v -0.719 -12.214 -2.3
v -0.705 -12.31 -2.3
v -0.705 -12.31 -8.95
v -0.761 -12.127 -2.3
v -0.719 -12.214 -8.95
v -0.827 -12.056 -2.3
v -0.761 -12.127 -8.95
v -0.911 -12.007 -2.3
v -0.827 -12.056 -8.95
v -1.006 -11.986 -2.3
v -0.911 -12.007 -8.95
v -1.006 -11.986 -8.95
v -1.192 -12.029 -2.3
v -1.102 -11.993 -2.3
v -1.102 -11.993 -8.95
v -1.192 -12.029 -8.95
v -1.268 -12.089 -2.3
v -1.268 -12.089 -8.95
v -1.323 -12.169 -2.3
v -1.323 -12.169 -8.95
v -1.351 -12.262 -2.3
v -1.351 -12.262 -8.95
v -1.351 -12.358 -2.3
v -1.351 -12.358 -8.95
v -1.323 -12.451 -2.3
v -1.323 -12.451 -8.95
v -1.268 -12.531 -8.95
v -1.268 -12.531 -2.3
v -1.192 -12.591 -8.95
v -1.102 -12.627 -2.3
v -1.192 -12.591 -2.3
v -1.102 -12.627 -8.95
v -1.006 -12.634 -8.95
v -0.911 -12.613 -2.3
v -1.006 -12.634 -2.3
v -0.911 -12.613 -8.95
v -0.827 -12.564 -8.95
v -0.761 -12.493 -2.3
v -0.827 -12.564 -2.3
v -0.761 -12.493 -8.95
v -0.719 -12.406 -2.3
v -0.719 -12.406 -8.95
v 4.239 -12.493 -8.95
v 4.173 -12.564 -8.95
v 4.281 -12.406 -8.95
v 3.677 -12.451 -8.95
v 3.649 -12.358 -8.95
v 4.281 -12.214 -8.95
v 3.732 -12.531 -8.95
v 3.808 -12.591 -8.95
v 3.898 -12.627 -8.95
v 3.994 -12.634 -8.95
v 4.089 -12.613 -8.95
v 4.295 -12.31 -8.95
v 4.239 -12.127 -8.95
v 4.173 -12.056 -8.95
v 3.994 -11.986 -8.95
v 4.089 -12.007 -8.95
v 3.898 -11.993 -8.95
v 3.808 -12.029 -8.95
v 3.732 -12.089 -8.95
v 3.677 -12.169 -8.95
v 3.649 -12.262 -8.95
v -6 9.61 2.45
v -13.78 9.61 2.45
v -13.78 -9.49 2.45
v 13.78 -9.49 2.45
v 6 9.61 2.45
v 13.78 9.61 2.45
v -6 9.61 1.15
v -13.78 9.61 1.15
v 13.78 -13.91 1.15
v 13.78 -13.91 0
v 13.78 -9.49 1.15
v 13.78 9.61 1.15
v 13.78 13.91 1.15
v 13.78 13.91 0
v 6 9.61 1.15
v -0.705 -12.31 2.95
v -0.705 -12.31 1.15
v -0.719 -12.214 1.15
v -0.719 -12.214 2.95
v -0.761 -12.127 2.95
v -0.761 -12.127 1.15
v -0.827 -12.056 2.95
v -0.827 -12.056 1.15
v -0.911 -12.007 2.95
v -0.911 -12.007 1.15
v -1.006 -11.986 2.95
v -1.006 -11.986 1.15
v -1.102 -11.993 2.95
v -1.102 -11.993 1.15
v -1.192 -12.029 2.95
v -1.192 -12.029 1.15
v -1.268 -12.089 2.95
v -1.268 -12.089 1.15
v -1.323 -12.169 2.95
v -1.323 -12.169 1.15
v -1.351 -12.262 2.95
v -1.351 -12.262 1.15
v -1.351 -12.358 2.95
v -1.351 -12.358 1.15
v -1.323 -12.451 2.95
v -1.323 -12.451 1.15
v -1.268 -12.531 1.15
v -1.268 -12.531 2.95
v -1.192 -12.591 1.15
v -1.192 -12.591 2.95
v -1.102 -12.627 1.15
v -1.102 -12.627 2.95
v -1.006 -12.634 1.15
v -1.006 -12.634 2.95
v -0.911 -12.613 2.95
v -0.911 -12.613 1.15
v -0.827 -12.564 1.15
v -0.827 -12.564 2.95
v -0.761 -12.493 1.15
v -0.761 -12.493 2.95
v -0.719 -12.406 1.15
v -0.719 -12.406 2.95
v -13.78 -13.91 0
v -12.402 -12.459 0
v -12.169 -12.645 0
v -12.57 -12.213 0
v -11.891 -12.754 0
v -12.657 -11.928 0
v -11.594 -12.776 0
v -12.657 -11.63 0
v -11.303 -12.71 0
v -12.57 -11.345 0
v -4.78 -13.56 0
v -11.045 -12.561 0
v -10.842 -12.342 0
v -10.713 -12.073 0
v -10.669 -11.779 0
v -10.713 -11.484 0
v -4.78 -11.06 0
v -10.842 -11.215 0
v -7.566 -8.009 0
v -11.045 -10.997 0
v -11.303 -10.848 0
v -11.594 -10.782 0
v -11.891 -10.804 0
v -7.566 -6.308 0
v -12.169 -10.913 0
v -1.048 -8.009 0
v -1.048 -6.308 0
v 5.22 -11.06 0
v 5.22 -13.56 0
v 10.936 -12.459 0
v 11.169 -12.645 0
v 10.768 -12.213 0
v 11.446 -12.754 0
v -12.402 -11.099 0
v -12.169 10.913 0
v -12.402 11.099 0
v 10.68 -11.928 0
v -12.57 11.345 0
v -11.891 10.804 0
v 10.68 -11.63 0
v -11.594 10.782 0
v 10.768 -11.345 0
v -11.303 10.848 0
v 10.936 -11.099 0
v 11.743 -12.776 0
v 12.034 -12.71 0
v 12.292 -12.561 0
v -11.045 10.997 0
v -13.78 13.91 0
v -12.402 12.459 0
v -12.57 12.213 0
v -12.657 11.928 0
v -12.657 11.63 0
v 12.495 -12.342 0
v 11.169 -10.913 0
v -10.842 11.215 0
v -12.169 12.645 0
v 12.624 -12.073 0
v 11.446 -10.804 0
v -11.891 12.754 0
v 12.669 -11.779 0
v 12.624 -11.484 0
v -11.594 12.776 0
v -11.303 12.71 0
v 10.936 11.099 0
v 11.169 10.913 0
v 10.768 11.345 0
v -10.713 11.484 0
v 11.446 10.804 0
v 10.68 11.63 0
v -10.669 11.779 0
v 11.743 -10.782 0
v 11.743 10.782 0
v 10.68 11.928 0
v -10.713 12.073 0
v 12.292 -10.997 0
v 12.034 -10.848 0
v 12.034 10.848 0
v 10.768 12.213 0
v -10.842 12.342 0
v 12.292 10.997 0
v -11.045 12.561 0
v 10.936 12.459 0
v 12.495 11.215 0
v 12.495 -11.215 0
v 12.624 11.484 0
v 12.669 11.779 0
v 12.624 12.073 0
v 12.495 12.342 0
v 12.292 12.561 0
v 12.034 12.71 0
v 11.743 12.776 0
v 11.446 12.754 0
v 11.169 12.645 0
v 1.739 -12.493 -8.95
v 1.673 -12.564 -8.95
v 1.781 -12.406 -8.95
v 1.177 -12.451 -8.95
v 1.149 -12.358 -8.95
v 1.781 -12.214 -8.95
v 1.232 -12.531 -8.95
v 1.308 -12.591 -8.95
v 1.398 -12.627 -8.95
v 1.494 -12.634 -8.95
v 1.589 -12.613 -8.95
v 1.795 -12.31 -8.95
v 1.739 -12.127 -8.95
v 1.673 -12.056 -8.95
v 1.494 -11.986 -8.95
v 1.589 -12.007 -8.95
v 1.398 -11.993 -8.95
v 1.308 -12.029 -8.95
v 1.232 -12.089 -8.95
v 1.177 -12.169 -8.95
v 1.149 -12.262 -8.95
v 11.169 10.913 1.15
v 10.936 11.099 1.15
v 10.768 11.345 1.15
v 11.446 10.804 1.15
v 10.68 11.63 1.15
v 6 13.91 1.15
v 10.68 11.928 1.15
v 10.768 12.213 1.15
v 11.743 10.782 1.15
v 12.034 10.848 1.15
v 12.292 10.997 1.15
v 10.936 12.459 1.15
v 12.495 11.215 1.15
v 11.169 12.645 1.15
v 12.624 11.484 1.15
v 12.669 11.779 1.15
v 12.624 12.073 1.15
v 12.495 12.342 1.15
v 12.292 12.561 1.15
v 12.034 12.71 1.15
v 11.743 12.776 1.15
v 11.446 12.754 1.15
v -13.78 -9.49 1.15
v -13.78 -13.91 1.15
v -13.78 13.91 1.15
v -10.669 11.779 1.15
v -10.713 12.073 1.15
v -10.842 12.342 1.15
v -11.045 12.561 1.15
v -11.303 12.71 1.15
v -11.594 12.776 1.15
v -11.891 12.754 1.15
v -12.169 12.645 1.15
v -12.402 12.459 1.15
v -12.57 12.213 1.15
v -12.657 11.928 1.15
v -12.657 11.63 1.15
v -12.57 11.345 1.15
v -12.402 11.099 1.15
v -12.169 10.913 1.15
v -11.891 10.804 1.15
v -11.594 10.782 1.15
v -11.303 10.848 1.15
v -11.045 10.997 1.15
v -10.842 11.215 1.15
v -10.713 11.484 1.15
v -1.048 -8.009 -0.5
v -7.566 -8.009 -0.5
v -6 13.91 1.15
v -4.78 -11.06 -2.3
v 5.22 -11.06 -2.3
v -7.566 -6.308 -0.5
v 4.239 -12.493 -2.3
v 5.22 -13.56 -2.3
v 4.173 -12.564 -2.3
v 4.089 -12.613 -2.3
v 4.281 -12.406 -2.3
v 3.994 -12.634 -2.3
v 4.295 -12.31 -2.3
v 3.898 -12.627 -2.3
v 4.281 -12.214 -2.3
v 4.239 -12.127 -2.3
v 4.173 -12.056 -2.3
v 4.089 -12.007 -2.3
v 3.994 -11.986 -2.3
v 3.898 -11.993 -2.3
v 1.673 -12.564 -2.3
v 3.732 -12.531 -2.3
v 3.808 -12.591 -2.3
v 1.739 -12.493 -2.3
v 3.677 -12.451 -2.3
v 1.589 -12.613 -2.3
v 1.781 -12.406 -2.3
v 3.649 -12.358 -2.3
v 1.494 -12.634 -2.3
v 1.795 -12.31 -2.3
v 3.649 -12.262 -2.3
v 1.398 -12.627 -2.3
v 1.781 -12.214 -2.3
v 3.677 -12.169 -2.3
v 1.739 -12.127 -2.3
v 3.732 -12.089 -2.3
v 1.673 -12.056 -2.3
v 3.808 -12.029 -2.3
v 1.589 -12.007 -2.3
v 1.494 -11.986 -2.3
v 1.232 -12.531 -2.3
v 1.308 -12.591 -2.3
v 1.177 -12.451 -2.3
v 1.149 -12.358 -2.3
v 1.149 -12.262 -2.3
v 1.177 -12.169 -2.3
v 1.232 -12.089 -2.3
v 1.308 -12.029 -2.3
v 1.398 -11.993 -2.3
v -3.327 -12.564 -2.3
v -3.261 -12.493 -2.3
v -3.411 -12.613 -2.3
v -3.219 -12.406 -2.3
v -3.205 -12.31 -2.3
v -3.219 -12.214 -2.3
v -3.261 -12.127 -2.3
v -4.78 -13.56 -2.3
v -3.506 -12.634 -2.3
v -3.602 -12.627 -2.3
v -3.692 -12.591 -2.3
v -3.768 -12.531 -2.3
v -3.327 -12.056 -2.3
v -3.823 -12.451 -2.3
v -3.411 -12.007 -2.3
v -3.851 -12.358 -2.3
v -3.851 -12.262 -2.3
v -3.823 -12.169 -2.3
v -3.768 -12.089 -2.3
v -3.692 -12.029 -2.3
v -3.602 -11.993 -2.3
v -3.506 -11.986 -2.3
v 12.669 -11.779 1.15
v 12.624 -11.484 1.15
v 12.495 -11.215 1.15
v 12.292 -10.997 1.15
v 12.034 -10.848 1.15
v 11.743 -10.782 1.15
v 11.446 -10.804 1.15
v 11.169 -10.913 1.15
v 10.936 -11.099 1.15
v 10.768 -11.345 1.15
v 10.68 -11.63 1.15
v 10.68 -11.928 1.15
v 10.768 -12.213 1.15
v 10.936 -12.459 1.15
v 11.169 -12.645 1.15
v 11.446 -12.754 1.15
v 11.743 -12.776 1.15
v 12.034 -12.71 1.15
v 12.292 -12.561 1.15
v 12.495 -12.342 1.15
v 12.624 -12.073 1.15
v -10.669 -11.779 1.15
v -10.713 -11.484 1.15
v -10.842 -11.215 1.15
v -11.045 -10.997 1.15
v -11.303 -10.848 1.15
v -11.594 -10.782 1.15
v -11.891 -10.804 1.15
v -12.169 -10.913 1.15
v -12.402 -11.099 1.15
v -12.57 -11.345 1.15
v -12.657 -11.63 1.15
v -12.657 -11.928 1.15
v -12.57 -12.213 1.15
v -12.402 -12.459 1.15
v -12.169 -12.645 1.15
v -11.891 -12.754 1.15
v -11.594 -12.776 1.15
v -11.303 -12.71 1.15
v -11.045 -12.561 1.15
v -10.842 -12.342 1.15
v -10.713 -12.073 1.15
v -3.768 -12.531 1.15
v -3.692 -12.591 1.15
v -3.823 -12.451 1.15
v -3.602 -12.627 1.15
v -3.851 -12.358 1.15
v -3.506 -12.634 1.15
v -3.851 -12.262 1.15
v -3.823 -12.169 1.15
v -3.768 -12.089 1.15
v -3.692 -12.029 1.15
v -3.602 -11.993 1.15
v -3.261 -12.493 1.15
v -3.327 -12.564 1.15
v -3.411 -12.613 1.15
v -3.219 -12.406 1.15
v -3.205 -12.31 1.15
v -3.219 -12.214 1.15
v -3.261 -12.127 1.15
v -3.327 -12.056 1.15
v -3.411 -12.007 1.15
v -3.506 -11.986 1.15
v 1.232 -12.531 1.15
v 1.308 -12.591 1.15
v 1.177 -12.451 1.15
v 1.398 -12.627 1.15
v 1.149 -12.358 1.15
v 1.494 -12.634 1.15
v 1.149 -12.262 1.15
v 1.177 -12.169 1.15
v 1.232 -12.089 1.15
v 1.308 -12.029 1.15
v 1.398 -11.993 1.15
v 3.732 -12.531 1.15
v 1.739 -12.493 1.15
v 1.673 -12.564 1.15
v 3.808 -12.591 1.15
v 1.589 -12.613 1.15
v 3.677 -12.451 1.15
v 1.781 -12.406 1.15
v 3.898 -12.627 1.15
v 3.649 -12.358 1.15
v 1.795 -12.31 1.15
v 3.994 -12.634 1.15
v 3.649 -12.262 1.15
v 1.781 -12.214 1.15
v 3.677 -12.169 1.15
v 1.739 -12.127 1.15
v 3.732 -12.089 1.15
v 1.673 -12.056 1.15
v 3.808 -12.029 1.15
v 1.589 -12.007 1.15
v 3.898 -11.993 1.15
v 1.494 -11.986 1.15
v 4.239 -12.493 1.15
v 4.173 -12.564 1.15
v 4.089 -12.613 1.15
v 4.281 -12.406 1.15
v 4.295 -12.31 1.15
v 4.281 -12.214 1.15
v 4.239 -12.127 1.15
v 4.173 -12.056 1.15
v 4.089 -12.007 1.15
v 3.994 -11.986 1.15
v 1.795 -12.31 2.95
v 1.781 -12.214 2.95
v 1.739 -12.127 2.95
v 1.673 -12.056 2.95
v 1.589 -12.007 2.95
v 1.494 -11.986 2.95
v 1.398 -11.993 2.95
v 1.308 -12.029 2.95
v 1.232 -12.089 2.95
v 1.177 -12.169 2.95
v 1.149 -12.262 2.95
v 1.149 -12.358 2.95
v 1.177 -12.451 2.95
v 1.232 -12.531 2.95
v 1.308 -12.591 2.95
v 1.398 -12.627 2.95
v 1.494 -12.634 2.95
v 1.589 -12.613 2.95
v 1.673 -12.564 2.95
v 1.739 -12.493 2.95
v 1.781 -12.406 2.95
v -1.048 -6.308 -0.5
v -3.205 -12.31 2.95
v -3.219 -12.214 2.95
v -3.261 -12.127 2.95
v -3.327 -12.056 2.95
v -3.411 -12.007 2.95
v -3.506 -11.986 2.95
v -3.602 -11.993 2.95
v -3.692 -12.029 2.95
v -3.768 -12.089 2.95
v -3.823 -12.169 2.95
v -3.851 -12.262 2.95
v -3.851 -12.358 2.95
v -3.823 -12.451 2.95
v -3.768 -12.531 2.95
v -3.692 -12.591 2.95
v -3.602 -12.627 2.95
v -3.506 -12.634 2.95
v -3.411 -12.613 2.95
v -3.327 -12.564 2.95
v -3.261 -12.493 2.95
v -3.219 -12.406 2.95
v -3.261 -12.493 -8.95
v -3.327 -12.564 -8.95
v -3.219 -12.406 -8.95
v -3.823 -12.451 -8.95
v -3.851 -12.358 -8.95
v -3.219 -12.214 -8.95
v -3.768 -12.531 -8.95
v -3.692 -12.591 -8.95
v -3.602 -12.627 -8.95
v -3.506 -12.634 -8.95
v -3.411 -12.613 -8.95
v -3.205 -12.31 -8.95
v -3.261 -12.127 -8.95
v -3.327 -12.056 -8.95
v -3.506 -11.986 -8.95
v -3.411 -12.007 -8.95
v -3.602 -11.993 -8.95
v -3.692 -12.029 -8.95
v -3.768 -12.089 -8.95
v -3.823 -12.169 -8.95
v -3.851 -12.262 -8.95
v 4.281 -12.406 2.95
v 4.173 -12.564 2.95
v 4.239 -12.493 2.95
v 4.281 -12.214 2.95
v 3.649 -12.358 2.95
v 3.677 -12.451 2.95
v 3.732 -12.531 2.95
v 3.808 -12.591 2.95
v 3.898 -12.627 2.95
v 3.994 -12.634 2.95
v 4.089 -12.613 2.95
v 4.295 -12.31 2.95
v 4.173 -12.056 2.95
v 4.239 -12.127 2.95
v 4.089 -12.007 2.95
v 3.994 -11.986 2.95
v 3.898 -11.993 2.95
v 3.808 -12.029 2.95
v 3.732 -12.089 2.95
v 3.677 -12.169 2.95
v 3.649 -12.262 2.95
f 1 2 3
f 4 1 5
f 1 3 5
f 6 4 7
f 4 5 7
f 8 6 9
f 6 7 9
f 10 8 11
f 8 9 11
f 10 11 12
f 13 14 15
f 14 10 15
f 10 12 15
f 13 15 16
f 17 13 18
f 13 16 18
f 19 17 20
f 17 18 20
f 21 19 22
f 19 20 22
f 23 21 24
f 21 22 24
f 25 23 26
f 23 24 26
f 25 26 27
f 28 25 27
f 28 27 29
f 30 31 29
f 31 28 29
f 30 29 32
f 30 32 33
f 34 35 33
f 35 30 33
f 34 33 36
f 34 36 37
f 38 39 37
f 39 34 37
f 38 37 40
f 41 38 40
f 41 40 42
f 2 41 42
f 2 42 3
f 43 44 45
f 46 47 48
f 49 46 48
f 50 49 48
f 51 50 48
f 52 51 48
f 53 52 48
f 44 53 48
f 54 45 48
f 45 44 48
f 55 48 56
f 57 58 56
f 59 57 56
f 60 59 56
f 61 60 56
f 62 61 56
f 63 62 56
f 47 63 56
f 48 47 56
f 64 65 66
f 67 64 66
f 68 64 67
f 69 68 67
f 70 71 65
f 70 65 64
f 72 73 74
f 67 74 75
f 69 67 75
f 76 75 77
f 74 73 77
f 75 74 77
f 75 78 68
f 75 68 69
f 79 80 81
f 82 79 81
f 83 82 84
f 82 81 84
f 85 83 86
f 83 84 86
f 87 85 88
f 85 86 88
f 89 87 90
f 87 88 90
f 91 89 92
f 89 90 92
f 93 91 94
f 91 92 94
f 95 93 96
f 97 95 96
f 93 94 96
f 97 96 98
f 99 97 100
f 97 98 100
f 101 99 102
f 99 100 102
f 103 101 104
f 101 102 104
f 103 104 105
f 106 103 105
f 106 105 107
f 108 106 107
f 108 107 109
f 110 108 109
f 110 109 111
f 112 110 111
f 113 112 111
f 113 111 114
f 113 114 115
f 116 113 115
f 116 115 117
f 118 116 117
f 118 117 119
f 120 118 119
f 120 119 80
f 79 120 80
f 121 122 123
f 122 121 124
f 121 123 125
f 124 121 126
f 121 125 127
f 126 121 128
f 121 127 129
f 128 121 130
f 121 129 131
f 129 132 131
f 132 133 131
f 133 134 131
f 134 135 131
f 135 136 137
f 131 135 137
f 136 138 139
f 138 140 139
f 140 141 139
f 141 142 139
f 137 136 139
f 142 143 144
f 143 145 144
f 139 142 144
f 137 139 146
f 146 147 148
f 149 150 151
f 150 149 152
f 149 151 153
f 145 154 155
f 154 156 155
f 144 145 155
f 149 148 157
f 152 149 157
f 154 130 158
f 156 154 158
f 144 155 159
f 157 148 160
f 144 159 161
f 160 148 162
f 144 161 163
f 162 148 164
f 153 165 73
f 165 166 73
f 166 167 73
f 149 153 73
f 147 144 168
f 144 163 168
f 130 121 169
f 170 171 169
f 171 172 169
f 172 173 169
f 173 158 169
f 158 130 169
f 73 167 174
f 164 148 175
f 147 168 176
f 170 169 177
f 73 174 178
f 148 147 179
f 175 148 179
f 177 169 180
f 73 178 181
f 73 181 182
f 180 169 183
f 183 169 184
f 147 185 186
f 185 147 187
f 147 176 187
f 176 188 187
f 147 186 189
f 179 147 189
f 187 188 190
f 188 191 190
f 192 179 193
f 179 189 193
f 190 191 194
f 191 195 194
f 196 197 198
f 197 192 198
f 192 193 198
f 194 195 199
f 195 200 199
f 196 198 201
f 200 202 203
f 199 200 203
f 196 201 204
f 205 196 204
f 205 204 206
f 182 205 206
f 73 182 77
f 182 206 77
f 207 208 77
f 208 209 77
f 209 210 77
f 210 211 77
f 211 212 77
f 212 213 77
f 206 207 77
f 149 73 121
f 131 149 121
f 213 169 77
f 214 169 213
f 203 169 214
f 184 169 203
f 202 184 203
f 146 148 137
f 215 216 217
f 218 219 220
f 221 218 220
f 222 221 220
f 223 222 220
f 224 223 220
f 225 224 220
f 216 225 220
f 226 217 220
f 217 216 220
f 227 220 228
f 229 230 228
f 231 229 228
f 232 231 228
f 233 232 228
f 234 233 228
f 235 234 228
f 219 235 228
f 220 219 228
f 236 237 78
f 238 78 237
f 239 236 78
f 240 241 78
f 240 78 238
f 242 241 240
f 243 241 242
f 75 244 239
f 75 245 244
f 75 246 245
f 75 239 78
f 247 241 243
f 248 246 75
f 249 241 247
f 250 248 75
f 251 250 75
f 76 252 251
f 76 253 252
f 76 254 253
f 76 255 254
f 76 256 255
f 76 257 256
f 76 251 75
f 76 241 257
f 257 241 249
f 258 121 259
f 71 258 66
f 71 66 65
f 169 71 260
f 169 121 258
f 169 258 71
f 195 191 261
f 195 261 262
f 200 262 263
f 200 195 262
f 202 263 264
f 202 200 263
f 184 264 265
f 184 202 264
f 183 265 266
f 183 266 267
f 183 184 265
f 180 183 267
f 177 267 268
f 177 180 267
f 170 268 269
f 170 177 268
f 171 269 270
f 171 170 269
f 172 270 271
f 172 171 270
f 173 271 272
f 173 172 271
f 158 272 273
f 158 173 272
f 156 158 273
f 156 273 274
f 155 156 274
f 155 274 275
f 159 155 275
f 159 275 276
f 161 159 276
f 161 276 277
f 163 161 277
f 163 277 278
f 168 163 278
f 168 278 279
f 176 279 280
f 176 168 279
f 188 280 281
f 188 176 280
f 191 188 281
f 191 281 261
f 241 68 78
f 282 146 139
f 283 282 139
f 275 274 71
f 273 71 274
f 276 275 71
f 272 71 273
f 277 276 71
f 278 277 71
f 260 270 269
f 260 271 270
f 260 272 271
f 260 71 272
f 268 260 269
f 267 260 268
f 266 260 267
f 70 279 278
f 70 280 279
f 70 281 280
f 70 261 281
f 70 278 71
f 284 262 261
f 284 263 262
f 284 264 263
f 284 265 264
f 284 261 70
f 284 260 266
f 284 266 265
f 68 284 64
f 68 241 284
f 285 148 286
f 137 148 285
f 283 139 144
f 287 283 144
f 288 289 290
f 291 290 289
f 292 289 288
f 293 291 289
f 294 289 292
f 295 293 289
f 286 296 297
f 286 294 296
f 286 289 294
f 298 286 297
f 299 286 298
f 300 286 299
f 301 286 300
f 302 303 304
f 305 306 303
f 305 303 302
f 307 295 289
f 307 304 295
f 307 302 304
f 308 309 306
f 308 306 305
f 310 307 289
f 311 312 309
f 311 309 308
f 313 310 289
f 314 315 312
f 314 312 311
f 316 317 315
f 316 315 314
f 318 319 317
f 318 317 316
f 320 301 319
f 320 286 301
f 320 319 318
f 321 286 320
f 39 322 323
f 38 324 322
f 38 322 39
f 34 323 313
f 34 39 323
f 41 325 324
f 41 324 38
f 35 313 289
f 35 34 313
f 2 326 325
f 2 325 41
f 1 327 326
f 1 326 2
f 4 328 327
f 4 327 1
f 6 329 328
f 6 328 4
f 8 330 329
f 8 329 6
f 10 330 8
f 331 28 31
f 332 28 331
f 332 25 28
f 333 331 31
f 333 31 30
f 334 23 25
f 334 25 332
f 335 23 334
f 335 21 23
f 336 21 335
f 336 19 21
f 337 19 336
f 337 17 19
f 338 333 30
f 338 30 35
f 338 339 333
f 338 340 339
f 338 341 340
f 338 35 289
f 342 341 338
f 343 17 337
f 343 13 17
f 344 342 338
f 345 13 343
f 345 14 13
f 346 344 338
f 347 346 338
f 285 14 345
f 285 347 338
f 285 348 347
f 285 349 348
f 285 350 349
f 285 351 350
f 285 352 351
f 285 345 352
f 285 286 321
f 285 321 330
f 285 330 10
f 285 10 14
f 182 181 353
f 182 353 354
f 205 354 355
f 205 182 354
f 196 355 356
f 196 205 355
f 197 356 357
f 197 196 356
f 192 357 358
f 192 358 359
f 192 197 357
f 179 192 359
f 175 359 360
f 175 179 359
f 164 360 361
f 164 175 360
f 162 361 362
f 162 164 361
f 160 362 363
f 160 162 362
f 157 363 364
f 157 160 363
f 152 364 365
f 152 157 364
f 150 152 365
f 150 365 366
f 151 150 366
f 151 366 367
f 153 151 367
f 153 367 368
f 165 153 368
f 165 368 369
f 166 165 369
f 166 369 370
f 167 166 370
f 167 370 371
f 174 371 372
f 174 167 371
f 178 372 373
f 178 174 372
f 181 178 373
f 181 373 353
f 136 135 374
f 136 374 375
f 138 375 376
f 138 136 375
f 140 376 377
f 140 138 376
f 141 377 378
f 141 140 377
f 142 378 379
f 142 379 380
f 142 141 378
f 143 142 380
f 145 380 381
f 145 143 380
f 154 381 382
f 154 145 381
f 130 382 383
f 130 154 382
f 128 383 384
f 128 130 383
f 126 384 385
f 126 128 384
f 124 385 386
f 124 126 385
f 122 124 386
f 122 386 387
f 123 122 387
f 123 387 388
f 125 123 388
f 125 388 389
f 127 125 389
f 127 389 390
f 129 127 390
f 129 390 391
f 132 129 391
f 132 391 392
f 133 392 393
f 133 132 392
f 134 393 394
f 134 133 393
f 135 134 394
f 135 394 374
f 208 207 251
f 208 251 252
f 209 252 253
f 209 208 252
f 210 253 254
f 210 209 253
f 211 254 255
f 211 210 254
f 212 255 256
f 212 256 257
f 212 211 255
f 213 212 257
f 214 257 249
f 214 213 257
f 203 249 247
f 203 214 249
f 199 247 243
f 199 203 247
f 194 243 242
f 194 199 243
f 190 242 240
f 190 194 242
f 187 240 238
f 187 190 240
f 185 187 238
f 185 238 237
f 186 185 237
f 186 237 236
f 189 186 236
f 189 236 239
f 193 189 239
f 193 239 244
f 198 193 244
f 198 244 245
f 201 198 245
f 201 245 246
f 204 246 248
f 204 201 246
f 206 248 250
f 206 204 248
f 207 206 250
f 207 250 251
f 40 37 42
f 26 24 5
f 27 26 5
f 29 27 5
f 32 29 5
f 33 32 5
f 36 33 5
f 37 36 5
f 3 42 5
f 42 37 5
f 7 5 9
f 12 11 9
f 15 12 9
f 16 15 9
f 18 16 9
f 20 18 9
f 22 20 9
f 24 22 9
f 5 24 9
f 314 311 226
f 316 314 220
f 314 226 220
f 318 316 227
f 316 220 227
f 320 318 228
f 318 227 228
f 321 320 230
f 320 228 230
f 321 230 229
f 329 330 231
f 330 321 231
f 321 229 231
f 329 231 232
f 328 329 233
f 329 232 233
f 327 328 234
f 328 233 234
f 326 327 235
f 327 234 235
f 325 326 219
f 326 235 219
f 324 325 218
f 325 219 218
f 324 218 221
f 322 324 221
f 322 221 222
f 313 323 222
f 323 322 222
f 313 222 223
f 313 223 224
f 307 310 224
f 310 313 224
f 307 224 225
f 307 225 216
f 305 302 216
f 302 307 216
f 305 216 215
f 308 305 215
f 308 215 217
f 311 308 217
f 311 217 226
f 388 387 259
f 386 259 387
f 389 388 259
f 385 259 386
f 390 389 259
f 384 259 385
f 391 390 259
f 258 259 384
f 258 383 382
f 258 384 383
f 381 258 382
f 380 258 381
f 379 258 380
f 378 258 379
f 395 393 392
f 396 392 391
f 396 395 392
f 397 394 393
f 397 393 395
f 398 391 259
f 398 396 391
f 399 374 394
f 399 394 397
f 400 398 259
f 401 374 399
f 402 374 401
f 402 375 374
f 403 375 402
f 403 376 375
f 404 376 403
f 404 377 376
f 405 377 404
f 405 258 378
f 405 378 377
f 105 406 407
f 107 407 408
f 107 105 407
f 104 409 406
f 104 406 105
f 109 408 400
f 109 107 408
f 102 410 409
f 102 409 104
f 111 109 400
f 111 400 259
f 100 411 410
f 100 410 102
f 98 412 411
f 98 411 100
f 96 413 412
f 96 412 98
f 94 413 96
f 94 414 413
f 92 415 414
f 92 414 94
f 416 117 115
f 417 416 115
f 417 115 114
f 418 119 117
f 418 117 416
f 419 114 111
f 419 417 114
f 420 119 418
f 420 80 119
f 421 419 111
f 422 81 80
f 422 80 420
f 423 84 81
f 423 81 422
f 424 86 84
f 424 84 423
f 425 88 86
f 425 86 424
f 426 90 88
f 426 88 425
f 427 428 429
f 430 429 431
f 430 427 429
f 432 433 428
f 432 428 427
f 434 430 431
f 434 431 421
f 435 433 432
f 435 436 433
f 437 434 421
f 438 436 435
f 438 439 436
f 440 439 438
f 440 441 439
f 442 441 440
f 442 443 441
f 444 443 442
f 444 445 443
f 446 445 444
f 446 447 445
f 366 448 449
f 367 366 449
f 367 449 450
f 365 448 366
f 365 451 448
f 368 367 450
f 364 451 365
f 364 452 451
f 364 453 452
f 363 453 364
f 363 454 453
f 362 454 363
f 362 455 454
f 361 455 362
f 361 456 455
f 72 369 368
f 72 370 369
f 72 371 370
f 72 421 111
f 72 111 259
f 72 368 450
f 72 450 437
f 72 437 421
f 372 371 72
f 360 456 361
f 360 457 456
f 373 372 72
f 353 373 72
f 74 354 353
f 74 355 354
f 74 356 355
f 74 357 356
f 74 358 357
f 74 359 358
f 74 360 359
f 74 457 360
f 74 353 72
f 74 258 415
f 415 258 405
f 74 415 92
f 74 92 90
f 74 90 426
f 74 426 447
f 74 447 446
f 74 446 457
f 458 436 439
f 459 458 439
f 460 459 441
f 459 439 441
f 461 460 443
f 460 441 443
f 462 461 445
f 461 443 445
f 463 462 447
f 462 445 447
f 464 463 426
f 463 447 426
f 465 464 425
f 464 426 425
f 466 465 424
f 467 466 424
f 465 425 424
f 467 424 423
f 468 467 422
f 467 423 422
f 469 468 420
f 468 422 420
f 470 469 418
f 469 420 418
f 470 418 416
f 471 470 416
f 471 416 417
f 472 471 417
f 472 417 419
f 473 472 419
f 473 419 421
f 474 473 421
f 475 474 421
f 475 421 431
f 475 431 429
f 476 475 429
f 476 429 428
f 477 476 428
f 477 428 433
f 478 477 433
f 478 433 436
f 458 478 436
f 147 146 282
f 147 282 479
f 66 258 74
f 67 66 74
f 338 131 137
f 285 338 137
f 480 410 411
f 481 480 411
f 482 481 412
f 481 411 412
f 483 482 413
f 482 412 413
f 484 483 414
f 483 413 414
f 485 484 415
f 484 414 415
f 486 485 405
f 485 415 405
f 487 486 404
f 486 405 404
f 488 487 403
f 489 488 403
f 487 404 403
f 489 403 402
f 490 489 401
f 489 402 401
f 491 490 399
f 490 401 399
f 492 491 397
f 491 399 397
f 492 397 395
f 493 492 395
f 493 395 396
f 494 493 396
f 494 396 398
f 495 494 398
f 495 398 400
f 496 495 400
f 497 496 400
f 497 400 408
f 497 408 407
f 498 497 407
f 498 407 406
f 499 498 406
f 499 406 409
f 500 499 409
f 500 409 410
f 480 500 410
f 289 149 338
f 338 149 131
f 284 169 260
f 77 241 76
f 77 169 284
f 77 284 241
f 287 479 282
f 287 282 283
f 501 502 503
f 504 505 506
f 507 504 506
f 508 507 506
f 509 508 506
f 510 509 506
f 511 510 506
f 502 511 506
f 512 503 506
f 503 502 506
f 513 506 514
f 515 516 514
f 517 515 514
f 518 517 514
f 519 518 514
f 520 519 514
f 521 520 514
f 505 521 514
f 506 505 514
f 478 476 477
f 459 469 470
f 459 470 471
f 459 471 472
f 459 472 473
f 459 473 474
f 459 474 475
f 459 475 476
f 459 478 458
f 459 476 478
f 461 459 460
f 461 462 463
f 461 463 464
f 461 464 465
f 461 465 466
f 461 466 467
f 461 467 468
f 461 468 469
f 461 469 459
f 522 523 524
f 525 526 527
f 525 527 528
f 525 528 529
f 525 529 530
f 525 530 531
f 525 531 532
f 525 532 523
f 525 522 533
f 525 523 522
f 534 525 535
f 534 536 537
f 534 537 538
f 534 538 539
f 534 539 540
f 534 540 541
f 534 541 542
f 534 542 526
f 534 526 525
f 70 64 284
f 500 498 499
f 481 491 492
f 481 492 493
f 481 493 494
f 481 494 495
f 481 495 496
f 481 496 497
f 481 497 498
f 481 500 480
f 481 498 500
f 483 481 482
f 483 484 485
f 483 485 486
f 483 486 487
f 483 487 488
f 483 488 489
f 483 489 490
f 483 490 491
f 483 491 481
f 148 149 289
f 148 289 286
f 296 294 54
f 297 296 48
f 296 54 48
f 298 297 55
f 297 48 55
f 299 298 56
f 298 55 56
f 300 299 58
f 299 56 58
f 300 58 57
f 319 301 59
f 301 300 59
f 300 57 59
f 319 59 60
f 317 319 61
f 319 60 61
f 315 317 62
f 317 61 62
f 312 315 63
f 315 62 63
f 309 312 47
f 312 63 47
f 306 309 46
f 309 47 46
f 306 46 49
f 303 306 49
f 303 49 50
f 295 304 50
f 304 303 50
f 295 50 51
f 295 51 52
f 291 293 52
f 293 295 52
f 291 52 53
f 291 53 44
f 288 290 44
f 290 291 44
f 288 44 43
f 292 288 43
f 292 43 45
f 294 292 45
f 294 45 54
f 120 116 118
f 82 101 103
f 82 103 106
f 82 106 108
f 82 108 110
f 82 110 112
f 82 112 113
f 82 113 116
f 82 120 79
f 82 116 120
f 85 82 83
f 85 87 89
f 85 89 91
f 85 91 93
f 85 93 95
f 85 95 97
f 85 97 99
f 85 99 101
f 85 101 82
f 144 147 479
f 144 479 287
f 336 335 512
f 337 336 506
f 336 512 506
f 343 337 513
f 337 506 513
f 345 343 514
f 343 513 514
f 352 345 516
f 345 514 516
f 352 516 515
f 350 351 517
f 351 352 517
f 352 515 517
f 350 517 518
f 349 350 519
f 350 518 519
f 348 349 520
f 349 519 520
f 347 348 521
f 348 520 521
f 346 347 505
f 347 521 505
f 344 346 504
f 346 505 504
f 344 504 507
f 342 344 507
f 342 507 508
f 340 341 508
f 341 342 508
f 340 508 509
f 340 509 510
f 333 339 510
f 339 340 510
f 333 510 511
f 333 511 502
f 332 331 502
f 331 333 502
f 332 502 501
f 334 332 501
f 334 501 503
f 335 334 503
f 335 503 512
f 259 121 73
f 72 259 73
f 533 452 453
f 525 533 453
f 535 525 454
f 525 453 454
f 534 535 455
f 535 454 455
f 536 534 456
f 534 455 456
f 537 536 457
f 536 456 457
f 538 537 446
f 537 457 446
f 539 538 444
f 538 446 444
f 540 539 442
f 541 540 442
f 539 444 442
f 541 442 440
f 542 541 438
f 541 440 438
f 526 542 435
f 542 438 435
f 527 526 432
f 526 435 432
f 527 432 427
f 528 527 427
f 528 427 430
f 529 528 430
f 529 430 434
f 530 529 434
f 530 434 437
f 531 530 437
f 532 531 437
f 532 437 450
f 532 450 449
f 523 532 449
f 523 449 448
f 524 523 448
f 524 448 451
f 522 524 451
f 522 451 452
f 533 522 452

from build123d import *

# Parameters (mm, degrees)
ESQUISSE1_W                = 27.56
ESQUISSE1_H                = 27.82
ESQUISSE1_R                = 1
BOSS_EXTRU_1_DEPTH         = 1.15
ESQUISSE3_W                = 27.56
ESQUISSE3_H                = 19.1
BOSS_EXTRU_2_DEPTH         = 1.3
BOSS_EXTRU_3_START         = -10.1
ESQUISSE4_R                = 0.325
BOSS_EXTRU_3_DEPTH         = 11.9
R_P_TITION_LIN_AIRE1_COUNT = 4
R_P_TITION_LIN_AIRE1_PITCH = 2.5
ESQUISSE5_W                = 6.517687079
ESQUISSE5_H                = 1.70105674
BOSS_EXTRU_4_DEPTH         = 0.5
ESQUISSE6_W                = 10
ESQUISSE6_H                = 2.5
BOSS_EXTRU_5_DEPTH         = 2.3
BOSS_EXTRU_6_DEPTH         = 6


with BuildPart() as part:
    # Esquisse1 → Boss.-Extru.1 (new body)
    with BuildSketch(Plane.XY):
        Rectangle(ESQUISSE1_W, ESQUISSE1_H)
        with Locations((-11.668662175, 11.778743894)):
            Circle(ESQUISSE1_R, mode=Mode.SUBTRACT)
        with Locations((11.668662175, 11.778743894)):
            Circle(ESQUISSE1_R, mode=Mode.SUBTRACT)
        with Locations((-11.668662175, -11.778743894)):
            Circle(ESQUISSE1_R, mode=Mode.SUBTRACT)
        with Locations((11.668662175, -11.778743894)):
            Circle(ESQUISSE1_R, mode=Mode.SUBTRACT)
    extrude(amount=BOSS_EXTRU_1_DEPTH)

    # Esquisse3 → Boss.-Extru.2 (add)
    with BuildSketch(Plane.XY.offset(1.15)):
        with Locations((0, 0.06)):
            Rectangle(ESQUISSE3_W, ESQUISSE3_H)
    extrude(amount=BOSS_EXTRU_2_DEPTH)

    # Esquisse4 → Boss.-Extru.3 (add)
    with BuildSketch(Plane.XY.offset(1.15).offset(BOSS_EXTRU_3_START)):
        with Locations((-3.53, -12.31)):
            Circle(ESQUISSE4_R)
    boss_extru_3 = extrude(amount=BOSS_EXTRU_3_DEPTH)

    # Répétition linéaire1: Boss.-Extru.3 ×4
    with Locations(*[(i * R_P_TITION_LIN_AIRE1_PITCH, 0, 0) for i in range(1, R_P_TITION_LIN_AIRE1_COUNT)]):
        add(boss_extru_3)

    # Esquisse5 → Boss.-Extru.4 (add)
    with BuildSketch(Plane(origin=(0, 0, 0), x_dir=(-1, 0, 0), z_dir=(0, 0, -1))):
        with Locations((4.307160535, -7.158796769)):
            Rectangle(ESQUISSE5_W, ESQUISSE5_H)
    extrude(amount=BOSS_EXTRU_4_DEPTH)

    # Esquisse6 → Boss.-Extru.5 (add)
    with BuildSketch(Plane(origin=(0, 0, 0), x_dir=(-1, 0, 0), z_dir=(0, 0, -1))):
        with Locations((-0.22, -12.31)):
            Rectangle(ESQUISSE6_W, ESQUISSE6_H)
    extrude(amount=BOSS_EXTRU_5_DEPTH)

    # Esquisse7 → Boss.-Extru.6 (add, symmetric)
    with BuildSketch(Plane(origin=(0, 0, 0), x_dir=(0, 0, -1), z_dir=(1, 0, 0))):
        Polygon((-1.15, 13.91), (-2.45, 9.61), (-1.15, 9.61), align=None)
    extrude(amount=BOSS_EXTRU_6_DEPTH, both=True)


solid = part.part
